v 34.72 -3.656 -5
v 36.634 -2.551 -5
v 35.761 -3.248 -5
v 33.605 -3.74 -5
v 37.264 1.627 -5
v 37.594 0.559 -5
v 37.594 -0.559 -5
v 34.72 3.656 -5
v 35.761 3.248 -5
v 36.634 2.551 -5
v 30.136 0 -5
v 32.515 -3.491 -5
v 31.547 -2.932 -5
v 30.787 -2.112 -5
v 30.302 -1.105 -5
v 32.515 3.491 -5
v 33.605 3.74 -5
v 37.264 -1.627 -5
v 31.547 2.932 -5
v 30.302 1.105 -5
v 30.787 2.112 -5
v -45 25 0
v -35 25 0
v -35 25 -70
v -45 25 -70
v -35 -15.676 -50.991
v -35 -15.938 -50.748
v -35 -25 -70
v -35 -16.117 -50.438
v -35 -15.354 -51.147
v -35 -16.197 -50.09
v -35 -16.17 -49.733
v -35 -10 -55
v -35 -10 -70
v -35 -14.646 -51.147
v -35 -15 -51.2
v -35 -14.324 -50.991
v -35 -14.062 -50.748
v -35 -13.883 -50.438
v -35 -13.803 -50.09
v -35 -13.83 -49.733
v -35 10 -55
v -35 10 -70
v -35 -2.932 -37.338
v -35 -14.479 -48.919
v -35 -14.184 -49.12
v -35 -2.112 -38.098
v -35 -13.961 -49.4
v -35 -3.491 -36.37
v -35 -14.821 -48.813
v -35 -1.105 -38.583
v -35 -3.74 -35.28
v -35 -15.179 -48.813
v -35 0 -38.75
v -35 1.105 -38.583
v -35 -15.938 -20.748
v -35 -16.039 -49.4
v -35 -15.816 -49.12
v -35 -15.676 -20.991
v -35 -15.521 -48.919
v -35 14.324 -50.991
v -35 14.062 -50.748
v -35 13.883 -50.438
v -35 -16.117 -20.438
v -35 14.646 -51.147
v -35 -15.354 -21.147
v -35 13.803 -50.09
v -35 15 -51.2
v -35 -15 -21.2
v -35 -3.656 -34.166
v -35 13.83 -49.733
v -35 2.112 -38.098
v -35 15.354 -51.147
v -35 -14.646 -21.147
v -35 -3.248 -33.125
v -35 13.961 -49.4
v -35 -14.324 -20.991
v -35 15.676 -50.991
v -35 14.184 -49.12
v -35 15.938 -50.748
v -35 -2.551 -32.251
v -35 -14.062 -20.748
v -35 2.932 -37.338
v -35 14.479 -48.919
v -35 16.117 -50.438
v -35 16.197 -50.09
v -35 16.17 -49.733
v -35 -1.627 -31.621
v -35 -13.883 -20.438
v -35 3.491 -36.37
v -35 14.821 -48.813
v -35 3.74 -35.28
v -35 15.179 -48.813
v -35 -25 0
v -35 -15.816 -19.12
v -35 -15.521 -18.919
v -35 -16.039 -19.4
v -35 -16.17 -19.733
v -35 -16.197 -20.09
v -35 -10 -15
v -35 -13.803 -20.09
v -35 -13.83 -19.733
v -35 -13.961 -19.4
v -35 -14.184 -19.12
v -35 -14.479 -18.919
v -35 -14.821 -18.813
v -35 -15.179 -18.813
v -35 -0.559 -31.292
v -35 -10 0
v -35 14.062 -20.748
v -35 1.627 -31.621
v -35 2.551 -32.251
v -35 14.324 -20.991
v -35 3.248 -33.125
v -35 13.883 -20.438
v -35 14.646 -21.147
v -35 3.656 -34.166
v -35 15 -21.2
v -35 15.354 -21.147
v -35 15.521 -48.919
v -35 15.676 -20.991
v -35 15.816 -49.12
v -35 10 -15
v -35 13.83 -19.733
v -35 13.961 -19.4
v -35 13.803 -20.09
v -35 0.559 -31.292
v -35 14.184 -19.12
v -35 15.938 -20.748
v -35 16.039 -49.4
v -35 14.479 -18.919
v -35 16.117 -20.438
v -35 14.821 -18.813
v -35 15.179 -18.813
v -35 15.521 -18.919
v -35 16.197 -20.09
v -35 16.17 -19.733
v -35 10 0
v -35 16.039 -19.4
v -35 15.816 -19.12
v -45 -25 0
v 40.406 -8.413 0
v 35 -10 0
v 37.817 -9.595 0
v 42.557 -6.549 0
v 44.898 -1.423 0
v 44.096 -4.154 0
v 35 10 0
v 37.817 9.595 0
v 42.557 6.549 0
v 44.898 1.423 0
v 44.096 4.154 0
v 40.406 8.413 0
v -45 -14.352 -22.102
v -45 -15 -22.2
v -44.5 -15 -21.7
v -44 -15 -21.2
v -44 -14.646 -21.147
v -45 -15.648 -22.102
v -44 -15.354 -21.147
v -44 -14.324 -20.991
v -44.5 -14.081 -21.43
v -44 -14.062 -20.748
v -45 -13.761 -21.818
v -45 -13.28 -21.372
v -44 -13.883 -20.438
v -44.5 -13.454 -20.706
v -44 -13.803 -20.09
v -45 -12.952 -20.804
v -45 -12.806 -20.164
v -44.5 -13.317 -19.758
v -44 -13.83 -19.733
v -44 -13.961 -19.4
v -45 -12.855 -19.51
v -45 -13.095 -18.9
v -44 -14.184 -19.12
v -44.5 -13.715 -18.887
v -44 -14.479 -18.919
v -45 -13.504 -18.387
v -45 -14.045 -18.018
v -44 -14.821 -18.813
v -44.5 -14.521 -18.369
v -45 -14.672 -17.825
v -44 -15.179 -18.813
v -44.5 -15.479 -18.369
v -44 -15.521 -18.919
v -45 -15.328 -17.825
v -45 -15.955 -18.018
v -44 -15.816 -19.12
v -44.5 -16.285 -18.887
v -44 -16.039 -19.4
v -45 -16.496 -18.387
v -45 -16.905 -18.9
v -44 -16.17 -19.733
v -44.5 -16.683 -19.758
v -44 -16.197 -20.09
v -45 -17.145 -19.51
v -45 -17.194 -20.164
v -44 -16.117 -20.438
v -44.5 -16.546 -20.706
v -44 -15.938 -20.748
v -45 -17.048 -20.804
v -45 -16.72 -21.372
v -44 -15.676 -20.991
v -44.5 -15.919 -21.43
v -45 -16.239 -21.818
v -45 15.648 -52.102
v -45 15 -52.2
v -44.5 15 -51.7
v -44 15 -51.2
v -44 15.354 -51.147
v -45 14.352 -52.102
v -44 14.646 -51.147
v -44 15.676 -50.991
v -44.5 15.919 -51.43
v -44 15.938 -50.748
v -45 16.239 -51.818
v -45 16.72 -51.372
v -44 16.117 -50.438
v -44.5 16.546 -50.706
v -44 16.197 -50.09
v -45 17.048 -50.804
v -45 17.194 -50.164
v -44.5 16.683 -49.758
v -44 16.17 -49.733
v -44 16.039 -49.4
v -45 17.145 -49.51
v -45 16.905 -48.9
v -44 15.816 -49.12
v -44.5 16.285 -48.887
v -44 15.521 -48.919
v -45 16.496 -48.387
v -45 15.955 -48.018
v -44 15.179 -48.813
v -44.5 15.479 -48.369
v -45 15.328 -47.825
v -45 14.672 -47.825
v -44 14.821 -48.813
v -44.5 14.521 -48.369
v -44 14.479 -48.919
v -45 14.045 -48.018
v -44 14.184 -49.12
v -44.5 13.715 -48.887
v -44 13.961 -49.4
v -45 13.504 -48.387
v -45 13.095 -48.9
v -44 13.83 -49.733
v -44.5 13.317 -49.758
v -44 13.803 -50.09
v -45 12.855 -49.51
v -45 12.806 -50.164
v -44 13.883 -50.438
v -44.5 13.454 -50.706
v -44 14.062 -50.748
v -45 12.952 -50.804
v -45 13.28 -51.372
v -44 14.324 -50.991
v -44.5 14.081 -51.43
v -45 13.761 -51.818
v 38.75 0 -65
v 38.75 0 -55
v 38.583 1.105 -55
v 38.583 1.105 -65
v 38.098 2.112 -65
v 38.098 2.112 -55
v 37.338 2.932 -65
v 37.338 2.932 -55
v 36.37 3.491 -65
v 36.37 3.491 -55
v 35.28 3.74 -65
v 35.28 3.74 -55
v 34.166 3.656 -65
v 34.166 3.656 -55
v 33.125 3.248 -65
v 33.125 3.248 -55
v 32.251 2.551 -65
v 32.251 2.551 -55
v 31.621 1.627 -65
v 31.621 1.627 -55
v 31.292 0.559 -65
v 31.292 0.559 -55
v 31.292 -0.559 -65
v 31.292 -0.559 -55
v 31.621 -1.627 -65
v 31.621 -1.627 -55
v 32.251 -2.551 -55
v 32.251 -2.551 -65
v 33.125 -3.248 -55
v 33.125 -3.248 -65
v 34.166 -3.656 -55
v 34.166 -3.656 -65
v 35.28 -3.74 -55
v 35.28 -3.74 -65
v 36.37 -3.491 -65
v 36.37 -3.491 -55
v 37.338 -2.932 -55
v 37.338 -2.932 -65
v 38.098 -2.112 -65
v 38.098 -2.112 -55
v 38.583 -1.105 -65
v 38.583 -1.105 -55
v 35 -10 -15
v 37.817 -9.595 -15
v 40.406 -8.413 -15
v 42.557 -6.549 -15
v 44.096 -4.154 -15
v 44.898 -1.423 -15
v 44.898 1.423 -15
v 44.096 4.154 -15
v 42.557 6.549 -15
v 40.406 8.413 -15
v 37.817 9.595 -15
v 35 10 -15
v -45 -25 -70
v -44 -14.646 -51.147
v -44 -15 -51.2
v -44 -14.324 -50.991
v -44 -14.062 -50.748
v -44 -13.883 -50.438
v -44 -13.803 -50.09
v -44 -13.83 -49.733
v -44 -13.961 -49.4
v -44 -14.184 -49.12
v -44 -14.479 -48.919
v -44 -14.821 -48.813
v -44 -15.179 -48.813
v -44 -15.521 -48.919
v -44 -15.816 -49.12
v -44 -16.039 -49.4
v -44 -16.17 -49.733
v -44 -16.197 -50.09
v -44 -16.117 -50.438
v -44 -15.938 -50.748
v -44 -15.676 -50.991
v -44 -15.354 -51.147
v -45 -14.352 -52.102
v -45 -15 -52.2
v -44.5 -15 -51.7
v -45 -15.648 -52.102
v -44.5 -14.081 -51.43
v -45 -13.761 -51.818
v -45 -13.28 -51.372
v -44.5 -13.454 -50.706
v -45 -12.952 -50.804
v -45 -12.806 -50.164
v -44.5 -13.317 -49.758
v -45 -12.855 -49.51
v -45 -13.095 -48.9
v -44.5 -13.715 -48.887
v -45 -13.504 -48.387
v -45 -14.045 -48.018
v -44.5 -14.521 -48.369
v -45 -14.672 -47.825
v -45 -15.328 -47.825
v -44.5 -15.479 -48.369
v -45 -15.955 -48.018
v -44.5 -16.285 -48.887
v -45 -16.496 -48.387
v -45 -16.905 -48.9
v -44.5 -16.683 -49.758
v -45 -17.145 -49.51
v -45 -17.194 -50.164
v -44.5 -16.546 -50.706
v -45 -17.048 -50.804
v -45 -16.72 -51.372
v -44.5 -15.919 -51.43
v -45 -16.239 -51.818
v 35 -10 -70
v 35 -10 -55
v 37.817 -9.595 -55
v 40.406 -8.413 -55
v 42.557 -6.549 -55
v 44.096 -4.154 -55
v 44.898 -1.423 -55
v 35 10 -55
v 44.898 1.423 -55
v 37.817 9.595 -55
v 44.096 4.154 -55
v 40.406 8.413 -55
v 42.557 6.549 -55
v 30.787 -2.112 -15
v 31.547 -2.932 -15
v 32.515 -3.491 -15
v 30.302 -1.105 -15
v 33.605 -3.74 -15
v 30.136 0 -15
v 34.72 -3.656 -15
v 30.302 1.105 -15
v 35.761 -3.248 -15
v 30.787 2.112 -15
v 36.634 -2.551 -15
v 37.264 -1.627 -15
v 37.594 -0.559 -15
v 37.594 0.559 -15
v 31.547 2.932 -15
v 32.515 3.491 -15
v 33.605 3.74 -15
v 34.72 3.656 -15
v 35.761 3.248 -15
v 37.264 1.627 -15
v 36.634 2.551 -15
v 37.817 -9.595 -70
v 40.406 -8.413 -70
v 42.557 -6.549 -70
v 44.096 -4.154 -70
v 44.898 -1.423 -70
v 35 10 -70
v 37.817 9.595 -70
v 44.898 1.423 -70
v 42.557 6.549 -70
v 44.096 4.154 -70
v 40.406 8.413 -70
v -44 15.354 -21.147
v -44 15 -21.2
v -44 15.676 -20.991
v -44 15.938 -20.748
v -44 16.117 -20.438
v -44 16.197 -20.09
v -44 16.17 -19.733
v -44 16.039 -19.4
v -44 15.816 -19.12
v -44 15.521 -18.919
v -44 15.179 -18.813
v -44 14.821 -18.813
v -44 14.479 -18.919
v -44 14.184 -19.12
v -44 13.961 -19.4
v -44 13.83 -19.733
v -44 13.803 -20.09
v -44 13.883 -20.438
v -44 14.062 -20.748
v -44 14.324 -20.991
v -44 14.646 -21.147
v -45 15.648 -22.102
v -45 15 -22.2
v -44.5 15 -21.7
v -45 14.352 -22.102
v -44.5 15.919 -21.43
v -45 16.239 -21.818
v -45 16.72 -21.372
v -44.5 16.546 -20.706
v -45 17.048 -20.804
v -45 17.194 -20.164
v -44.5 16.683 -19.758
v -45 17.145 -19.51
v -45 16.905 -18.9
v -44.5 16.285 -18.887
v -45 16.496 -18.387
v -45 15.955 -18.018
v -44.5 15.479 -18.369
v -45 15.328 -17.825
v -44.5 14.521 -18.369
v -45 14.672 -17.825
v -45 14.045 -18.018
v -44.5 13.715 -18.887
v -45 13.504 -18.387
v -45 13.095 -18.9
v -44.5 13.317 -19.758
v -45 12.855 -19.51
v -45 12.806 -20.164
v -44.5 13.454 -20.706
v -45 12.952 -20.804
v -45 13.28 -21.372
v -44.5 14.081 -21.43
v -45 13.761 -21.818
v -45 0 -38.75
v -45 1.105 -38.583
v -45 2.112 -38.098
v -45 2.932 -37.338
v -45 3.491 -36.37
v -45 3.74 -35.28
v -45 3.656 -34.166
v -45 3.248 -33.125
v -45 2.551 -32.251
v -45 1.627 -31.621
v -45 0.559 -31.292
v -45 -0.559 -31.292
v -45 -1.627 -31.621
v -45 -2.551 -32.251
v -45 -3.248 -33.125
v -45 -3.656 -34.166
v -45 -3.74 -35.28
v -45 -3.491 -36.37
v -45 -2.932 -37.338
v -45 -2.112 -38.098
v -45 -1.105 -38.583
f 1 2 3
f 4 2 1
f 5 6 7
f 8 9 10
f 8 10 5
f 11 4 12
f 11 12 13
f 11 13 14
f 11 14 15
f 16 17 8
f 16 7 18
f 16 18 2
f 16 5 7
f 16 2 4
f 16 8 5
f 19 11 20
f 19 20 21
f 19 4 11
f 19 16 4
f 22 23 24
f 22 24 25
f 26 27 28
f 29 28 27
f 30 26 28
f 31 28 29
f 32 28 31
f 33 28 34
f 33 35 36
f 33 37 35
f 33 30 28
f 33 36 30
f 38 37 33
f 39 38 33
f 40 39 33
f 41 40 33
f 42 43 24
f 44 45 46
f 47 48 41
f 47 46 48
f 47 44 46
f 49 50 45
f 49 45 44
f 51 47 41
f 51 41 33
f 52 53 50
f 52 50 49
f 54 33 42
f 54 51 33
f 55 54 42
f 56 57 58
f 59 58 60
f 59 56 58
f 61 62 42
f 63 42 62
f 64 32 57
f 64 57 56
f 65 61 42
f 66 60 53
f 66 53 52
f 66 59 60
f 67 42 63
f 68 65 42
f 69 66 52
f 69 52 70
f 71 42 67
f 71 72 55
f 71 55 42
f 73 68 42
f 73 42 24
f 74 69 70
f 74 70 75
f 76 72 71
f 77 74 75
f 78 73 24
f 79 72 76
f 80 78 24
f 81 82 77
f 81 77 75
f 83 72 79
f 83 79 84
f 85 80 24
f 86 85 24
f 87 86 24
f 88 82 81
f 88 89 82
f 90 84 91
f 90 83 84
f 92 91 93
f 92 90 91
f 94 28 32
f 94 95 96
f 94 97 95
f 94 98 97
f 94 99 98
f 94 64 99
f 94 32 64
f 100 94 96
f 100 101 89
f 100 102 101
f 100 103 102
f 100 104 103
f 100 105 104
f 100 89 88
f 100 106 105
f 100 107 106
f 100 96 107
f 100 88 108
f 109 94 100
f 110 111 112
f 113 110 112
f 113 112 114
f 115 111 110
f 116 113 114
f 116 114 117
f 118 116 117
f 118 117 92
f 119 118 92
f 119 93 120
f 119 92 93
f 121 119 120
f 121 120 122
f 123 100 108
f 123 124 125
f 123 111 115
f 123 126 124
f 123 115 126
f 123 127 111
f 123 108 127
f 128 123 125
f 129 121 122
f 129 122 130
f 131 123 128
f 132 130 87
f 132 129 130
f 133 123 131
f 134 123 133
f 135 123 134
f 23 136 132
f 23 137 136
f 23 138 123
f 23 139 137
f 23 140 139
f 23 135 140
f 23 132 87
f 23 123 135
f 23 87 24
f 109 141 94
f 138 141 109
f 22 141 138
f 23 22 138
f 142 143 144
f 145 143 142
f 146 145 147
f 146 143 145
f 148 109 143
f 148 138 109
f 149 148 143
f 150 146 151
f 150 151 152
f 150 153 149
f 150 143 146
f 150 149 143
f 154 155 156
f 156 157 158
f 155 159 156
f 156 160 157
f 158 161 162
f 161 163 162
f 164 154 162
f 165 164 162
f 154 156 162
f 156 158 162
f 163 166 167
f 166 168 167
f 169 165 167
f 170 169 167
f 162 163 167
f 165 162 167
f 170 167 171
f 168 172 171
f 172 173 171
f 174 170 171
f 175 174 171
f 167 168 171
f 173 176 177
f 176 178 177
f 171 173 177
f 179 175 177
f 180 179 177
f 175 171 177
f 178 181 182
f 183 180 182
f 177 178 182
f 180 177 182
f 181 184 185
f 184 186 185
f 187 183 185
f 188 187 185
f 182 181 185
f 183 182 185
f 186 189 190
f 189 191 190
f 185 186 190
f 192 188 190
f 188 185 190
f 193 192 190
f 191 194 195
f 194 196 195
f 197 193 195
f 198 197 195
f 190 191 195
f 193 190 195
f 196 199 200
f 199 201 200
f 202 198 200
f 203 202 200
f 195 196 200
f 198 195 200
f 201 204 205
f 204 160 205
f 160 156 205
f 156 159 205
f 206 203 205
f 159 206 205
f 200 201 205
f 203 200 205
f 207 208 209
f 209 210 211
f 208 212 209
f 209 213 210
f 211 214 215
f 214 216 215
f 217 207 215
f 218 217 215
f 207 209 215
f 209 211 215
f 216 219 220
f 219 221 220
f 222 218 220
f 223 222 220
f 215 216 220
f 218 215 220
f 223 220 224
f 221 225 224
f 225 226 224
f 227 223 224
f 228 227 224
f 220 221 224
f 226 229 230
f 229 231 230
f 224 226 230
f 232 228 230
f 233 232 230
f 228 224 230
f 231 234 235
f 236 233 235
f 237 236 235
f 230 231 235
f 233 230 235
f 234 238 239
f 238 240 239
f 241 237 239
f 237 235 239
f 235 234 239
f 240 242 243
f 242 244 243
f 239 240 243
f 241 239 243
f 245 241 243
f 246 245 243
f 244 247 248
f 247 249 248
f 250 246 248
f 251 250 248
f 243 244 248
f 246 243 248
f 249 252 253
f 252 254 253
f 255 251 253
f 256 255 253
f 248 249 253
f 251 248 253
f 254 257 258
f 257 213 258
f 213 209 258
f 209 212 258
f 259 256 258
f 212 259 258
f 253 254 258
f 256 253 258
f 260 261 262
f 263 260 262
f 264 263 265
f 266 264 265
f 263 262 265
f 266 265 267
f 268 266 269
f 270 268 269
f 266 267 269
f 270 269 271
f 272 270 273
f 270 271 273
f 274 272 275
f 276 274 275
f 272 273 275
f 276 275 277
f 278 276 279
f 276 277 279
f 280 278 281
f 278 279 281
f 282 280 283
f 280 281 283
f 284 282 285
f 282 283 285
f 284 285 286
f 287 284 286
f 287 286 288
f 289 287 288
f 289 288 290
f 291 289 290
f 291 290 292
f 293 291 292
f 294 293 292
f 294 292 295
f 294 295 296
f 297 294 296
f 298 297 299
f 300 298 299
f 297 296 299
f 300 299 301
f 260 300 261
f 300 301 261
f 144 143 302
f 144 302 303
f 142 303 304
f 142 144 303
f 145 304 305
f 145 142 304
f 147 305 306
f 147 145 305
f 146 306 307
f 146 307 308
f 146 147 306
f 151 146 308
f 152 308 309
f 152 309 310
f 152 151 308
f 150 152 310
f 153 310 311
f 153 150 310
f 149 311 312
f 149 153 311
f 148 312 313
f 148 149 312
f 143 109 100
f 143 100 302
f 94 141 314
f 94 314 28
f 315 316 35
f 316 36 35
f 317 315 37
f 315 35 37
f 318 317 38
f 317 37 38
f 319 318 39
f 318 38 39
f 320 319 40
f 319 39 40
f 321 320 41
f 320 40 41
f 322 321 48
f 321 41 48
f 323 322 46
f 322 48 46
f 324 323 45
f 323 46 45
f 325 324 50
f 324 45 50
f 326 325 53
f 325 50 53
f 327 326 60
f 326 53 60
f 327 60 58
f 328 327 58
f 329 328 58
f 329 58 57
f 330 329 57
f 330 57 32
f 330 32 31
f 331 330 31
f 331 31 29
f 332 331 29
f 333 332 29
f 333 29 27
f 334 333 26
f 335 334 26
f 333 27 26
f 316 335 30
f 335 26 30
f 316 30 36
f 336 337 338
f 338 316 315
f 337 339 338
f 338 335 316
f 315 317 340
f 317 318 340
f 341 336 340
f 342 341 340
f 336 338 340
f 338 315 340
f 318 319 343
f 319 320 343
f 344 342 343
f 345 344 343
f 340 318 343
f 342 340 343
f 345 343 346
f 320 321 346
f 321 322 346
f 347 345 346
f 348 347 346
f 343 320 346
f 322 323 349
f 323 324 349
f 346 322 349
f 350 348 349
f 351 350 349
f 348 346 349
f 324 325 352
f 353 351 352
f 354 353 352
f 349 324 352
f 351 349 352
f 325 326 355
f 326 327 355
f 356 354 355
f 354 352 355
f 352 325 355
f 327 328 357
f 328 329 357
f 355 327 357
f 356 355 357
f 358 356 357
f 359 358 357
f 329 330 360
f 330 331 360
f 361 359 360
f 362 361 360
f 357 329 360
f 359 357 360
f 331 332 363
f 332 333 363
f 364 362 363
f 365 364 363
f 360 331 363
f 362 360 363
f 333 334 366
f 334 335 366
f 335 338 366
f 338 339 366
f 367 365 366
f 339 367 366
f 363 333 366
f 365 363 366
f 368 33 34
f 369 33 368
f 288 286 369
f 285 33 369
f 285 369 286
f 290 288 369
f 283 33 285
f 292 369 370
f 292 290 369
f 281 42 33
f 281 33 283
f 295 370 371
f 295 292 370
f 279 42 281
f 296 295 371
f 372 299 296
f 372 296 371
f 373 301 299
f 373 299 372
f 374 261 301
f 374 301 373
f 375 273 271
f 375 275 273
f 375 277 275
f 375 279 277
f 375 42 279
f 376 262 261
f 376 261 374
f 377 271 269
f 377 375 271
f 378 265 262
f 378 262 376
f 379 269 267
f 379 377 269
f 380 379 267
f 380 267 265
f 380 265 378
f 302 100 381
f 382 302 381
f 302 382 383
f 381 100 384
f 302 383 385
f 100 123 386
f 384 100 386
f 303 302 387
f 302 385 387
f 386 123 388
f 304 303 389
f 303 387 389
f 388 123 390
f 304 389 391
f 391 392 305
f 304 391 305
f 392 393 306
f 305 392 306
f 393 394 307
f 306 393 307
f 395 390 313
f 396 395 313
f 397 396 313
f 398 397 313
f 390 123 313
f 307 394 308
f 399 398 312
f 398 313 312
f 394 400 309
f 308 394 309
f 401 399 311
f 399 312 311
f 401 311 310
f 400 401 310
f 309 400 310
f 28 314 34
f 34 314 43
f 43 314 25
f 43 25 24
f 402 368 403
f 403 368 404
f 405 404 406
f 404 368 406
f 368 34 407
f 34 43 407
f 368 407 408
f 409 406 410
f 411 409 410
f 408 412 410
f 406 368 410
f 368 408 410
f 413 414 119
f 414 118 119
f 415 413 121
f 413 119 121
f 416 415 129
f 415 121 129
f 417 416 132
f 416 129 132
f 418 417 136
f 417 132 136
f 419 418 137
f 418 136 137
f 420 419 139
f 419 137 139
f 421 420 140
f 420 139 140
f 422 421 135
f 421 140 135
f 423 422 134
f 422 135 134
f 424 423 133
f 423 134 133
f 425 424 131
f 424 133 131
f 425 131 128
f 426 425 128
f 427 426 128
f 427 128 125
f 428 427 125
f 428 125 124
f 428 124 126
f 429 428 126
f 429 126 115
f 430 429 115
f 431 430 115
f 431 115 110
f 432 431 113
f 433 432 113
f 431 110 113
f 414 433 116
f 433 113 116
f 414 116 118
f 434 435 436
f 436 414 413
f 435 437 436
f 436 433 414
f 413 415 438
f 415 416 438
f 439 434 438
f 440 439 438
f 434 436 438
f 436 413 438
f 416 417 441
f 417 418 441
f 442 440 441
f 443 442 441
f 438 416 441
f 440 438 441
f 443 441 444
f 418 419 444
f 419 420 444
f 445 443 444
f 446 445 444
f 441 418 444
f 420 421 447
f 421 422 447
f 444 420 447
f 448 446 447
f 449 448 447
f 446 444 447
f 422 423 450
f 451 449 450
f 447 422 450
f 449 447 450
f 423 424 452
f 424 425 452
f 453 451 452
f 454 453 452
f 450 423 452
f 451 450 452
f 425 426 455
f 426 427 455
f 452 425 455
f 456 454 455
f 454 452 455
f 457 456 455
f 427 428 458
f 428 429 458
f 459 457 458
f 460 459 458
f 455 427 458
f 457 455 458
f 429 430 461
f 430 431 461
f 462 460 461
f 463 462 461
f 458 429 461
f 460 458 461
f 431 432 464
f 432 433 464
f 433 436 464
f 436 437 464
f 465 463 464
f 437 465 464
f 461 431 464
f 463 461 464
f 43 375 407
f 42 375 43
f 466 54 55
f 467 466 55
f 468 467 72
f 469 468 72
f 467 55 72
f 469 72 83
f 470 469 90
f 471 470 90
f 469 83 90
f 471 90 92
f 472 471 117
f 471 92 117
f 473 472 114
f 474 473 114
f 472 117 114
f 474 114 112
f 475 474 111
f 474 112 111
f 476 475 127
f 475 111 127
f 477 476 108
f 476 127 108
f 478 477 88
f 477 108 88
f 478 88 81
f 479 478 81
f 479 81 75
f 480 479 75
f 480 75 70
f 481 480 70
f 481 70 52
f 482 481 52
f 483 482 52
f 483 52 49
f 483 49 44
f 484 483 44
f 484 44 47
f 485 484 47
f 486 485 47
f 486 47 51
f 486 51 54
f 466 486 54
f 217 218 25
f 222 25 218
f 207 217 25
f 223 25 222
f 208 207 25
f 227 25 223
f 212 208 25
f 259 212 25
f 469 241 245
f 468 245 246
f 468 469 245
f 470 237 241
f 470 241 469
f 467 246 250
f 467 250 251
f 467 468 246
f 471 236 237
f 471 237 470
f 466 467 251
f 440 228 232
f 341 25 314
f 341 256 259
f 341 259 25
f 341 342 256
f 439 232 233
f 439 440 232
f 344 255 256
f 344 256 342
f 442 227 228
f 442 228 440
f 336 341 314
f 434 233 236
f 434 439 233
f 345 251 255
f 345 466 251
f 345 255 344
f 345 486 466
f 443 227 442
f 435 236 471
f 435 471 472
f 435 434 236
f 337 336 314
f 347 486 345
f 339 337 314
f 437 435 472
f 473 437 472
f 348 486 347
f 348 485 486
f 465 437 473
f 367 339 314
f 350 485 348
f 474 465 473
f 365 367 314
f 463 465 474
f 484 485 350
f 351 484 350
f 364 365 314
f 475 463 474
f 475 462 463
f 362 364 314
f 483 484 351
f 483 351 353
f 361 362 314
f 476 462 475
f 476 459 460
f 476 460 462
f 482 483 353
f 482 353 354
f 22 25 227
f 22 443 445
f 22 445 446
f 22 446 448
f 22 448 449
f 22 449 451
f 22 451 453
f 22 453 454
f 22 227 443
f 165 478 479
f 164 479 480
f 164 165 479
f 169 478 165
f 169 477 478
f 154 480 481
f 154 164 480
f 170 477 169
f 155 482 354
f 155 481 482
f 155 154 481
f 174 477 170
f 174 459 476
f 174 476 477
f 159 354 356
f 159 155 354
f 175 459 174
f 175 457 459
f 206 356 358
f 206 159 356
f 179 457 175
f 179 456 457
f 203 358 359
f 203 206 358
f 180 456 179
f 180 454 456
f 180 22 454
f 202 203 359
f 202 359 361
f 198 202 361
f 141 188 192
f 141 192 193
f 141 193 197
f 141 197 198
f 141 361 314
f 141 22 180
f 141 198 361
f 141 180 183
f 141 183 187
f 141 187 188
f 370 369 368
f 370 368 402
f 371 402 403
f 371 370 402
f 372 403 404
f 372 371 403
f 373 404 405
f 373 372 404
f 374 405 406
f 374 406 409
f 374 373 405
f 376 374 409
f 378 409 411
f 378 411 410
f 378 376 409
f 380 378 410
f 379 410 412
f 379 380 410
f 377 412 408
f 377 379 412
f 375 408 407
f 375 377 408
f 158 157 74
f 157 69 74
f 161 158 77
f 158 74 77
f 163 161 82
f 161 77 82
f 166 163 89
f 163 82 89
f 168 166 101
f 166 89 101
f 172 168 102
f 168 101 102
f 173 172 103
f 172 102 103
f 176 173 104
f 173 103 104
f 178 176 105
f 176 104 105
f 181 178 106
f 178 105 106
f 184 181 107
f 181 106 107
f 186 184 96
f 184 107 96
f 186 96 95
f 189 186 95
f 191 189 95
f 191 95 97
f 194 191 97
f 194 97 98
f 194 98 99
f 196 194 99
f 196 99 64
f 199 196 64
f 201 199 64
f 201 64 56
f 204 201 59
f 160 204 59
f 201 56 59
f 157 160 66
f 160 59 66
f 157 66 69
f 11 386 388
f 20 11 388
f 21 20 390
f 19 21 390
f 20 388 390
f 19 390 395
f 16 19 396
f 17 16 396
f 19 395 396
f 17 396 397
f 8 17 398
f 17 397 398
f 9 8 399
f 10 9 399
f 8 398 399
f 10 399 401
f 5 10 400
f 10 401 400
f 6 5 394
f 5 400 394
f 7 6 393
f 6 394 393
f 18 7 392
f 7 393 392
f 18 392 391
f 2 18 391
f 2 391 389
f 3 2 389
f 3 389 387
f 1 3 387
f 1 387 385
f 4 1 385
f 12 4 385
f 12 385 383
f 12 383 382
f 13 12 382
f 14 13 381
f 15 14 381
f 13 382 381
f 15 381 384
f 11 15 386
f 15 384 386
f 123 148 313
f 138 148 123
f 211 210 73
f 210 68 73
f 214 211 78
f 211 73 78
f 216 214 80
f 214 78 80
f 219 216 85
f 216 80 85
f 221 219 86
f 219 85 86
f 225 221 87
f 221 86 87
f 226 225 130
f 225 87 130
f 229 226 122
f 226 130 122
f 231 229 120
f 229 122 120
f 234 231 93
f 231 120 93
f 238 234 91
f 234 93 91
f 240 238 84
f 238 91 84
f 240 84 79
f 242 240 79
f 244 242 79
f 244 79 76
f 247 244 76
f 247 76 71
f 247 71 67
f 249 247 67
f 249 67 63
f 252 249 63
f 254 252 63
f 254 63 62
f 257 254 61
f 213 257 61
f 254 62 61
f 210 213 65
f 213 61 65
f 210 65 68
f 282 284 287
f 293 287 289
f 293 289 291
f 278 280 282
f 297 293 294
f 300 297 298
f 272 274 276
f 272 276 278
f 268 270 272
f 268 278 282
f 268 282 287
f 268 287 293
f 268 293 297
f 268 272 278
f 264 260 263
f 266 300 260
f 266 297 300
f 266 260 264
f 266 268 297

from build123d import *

# Parameters (mm, degrees)
BOSS_EXTRUDE1_DEPTH                             = 70
SKETCH2_W                                       = 100.495668723
SKETCH2_H                                       = 40
CUT_EXTRUDE1_DEPTH                              = 91.277350426
SKETCH3_R                                       = 3.75
CUT_EXTRUDE2_DEPTH                              = 10
SKETCH4_R                                       = 3.75
CUT_EXTRUDE3_DEPTH                              = 10
SKETCH5_R                                       = 3.75
CUT_EXTRUDE4_DEPTH                              = 110.201648339
CSK_FOR_M2_FLAT_HEAD_MACHINE_SCREW1_D           = 2.4
CSK_FOR_M2_FLAT_HEAD_MACHINE_SCREW1_CSINK_D     = 4.4
CSK_FOR_M2_FLAT_HEAD_MACHINE_SCREW1_CSINK_ANGLE = 90


with BuildPart() as part:
    # Sketch1 → Boss-Extrude1 (new body)
    with BuildSketch(Plane.XY):
        with BuildLine():
            Line((-35, 10), (-35, 25))
            Line((-35, 25), (-45, 25))
            Line((-45, 25), (-45, -25))
            Line((-45, -25), (-35, -25))
            Line((-35, -25), (-35, -10))
            Line((-35, -10), (35, -10))
            ThreePointArc((35, -10), (45, 0), (35, 10))
            Line((35, 10), (-35, 10))
        make_face()
    extrude(amount=-BOSS_EXTRUDE1_DEPTH)

    # Sketch2 → Cut-Extrude1 (cut, through all)
    with BuildSketch(Plane(origin=(0, 10, 0), x_dir=(1, 0, 0), z_dir=(0, 1, 0))):
        with Locations((15.247834362, 35)):
            Rectangle(SKETCH2_W, SKETCH2_H)
    extrude(amount=-CUT_EXTRUDE1_DEPTH, mode=Mode.SUBTRACT)

    # Sketch3 → Cut-Extrude2 (cut)
    with BuildSketch(Plane.XY.offset(-55)):
        with Locations((35, 0)):
            Circle(SKETCH3_R)
    extrude(amount=-CUT_EXTRUDE2_DEPTH, mode=Mode.SUBTRACT)

    # Sketch4 → Cut-Extrude3 (cut)
    with BuildSketch(Plane(origin=(0, 0, -15), x_dir=(-1, 0, 0), z_dir=(0, 0, -1))):
        with Locations((-33.885516641, 0)):
            Circle(SKETCH4_R)
    extrude(amount=-CUT_EXTRUDE3_DEPTH, mode=Mode.SUBTRACT)

    # Sketch5 → Cut-Extrude4 (cut, through all)
    with BuildSketch(Plane(origin=(-35, 0, 0), x_dir=(0, 0, -1), z_dir=(1, 0, 0))):
        with Locations((35, 0)):
            Circle(SKETCH5_R)
    extrude(amount=-CUT_EXTRUDE4_DEPTH, mode=Mode.SUBTRACT)

    # CSK for M2 Flat Head Machine Screw1 (through all)
    with Locations(Plane.ZY.offset(45)):
        with Locations((-50, 15), (-20, 15), (-20, -15), (-50, -15)):
            CounterSinkHole(CSK_FOR_M2_FLAT_HEAD_MACHINE_SCREW1_D / 2, CSK_FOR_M2_FLAT_HEAD_MACHINE_SCREW1_CSINK_D / 2, counter_sink_angle=CSK_FOR_M2_FLAT_HEAD_MACHINE_SCREW1_CSINK_ANGLE)


solid = part.part
